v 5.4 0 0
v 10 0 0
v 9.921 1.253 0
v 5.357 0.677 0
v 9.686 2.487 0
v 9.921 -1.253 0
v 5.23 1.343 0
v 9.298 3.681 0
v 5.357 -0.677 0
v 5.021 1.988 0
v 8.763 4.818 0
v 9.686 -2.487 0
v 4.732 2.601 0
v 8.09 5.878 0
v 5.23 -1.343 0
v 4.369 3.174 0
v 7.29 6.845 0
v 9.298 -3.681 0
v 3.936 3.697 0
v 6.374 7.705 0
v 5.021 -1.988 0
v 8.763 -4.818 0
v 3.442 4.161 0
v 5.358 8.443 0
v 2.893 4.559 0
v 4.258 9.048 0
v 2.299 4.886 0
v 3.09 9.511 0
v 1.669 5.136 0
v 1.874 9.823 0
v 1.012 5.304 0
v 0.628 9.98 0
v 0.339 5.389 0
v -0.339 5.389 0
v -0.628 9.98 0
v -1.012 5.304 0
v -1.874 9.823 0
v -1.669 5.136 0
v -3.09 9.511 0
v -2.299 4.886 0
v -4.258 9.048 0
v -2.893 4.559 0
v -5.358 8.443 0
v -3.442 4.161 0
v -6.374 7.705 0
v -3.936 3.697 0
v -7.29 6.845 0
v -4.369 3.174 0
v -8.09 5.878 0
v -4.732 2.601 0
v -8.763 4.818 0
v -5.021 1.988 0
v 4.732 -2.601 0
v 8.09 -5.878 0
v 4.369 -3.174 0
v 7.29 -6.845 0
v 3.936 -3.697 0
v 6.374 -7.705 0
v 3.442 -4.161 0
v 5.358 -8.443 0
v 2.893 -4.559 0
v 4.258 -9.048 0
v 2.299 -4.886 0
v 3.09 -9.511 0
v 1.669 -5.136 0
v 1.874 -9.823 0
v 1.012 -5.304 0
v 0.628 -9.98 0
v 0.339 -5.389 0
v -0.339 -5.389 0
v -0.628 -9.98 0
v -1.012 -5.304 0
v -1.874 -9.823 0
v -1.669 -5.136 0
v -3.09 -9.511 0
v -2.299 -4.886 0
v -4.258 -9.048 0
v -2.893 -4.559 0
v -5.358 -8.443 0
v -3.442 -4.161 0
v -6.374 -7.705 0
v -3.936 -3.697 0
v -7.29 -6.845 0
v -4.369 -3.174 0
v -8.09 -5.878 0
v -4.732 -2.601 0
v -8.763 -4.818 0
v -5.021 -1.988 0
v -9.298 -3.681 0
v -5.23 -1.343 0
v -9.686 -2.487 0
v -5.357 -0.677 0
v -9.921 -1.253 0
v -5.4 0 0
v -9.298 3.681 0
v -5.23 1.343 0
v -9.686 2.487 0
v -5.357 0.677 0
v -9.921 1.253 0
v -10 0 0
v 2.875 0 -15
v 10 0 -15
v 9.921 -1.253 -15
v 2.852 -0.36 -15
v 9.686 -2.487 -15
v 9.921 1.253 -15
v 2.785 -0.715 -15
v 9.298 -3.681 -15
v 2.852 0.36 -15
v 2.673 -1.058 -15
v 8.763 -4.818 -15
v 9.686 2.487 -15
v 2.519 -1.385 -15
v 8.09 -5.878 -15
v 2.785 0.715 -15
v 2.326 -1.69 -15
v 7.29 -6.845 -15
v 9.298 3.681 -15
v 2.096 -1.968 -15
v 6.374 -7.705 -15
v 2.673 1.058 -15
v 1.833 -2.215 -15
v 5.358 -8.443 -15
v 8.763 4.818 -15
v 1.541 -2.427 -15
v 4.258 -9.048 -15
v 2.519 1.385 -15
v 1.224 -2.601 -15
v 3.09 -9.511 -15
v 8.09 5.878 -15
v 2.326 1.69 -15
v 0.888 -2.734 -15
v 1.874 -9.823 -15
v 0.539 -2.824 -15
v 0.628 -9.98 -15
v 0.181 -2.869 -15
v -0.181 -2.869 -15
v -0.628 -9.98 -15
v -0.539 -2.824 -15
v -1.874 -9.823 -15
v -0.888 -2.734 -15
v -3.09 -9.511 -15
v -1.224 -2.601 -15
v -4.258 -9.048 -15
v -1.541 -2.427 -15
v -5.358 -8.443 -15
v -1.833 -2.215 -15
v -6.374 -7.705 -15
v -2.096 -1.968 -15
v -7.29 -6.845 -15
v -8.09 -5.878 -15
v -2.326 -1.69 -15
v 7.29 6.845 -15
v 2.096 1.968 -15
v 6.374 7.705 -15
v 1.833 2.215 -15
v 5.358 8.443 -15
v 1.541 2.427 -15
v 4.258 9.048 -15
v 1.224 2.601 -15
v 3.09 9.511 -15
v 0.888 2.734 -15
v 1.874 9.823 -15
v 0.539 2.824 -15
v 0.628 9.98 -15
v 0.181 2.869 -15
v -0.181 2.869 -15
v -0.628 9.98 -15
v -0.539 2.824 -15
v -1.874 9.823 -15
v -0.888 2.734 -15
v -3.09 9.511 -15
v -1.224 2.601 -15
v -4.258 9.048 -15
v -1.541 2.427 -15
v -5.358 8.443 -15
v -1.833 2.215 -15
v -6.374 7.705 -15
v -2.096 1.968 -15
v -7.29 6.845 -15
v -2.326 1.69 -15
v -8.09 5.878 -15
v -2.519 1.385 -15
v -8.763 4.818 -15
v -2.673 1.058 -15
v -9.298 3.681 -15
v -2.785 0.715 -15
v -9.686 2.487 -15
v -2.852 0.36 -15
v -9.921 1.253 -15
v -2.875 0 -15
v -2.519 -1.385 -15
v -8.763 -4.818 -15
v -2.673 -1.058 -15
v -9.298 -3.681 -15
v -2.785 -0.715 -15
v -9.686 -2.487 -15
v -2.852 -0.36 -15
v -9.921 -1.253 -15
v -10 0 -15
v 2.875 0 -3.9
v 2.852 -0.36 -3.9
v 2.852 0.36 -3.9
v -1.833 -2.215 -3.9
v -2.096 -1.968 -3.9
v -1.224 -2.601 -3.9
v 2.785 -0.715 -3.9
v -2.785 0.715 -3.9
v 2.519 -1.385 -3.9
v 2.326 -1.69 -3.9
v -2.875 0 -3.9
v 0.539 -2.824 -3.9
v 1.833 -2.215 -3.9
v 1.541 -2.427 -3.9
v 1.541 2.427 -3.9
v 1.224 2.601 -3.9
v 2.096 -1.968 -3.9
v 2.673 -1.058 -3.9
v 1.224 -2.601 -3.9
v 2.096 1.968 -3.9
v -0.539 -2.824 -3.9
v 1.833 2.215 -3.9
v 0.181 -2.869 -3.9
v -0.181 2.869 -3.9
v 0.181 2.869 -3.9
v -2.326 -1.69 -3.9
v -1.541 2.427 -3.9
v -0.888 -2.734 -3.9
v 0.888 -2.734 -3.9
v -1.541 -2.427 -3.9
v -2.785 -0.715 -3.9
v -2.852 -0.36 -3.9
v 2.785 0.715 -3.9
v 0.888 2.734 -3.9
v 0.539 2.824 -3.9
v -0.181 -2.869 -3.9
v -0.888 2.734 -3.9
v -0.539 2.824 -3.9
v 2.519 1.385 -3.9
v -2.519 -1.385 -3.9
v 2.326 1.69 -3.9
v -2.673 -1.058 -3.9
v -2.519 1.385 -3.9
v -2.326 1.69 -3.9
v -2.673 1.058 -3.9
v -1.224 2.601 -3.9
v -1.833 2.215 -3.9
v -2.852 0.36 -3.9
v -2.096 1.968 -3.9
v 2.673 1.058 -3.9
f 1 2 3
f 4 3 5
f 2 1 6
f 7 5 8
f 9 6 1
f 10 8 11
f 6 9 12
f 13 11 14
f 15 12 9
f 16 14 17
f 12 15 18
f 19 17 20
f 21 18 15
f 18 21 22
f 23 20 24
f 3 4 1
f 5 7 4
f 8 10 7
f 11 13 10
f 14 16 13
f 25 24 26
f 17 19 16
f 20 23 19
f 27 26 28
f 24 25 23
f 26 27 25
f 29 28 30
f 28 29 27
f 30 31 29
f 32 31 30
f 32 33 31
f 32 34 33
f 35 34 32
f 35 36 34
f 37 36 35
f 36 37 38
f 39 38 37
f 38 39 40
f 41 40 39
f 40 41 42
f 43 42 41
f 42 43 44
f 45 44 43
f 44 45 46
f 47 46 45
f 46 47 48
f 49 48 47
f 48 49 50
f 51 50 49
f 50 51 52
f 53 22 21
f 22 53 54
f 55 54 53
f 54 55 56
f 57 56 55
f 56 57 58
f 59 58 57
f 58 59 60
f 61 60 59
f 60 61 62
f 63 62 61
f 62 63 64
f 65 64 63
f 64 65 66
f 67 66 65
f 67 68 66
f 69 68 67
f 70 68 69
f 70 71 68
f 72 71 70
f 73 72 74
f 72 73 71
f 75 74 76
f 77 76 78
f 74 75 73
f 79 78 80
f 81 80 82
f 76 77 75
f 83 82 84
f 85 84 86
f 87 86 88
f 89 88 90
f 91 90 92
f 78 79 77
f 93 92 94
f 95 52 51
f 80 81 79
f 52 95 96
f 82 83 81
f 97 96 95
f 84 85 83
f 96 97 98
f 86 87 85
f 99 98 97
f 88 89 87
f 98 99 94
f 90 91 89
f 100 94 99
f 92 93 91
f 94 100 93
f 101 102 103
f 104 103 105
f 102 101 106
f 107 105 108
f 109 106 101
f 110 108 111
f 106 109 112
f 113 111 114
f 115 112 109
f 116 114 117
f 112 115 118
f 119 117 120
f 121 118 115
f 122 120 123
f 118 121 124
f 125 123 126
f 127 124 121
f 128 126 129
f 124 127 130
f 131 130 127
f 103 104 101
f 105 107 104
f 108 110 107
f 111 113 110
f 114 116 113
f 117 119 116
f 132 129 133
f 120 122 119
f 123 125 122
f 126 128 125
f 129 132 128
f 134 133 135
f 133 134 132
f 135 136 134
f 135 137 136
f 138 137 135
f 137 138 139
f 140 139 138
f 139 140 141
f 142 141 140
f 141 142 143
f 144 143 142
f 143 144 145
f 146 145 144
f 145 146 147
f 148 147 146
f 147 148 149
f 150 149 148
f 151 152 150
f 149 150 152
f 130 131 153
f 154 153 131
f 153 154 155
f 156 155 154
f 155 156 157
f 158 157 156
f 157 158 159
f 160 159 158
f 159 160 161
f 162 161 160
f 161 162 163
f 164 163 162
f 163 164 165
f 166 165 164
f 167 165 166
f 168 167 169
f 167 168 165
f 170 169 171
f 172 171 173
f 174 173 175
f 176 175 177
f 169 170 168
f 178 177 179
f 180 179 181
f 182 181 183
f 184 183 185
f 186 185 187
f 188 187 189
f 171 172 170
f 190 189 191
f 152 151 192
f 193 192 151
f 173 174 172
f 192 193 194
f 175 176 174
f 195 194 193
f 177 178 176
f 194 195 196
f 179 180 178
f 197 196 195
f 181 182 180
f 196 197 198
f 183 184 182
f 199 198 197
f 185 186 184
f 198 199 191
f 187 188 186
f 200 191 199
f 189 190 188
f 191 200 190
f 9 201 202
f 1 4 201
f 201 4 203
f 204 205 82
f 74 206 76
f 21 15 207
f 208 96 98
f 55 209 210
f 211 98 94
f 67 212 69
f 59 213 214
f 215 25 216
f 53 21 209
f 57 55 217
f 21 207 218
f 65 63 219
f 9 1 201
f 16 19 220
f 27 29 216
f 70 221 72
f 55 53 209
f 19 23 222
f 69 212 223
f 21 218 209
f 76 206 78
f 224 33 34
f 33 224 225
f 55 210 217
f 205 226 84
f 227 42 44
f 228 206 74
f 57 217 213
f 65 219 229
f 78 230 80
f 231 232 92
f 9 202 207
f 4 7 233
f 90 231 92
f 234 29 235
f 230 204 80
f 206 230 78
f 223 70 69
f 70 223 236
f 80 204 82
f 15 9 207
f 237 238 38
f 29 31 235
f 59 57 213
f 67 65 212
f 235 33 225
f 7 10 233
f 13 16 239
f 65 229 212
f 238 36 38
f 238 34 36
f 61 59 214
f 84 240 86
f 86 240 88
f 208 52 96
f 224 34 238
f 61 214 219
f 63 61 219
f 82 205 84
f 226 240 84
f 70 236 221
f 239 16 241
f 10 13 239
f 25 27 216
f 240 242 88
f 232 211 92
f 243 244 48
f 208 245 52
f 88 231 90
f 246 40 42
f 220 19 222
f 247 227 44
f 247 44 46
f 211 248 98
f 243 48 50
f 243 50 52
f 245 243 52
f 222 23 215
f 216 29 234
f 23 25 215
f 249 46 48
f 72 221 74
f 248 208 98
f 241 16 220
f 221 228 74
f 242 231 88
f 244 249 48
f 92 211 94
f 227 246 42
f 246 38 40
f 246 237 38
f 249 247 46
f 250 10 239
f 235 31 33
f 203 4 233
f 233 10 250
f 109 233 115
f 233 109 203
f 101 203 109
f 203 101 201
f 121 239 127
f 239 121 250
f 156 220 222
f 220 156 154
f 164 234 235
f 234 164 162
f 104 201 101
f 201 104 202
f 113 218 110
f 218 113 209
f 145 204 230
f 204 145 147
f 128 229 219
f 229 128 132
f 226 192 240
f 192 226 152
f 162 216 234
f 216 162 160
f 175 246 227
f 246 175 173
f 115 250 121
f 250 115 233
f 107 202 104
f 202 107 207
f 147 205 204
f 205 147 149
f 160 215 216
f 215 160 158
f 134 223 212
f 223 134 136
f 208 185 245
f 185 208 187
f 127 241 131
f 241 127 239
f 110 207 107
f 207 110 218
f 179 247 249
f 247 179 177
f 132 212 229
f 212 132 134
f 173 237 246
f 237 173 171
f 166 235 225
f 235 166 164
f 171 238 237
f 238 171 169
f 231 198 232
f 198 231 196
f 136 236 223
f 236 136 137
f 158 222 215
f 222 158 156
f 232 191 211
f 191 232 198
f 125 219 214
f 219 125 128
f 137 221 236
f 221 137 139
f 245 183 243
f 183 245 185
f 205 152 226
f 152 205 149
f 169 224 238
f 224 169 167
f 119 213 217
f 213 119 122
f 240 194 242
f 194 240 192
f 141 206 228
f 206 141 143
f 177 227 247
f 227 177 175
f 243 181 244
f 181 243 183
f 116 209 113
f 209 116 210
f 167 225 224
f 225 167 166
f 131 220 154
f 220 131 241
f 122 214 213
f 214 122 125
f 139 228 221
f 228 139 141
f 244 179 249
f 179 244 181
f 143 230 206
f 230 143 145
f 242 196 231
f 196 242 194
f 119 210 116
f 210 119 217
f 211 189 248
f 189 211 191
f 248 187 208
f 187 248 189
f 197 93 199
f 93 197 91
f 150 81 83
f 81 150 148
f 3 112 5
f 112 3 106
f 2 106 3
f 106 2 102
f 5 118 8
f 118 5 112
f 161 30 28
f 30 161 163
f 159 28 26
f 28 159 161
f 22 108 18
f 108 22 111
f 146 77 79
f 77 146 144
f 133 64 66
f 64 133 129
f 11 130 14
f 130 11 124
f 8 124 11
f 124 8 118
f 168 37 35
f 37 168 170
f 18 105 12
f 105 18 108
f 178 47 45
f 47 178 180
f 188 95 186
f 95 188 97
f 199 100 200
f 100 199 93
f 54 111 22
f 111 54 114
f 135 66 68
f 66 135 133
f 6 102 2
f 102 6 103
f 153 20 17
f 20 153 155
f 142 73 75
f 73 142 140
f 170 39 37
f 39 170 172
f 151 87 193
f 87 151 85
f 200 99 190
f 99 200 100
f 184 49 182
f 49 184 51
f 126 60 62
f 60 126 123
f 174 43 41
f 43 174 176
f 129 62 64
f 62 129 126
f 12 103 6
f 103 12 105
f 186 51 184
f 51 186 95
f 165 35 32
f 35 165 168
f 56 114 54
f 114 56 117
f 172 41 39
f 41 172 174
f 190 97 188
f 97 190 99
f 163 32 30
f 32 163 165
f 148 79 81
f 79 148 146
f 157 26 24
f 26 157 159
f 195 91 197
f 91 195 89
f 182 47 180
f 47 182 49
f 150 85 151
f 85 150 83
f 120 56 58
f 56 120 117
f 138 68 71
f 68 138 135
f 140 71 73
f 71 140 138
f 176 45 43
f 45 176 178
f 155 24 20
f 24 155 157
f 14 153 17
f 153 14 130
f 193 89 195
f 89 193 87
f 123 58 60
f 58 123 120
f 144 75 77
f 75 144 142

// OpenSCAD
$fn = 50;


difference() {
	union() {
		translate(v = [0, 0, -15.0000000000]) {
			cylinder(h = 15, r = 10.0000000000);
		}
		cylinder(h = 0, r = 16.0000000000);
	}
	union() {
		translate(v = [0, 0, 0]) {
			rotate(a = [0, 0, 0]) {
				difference() {
					union() {
						#translate(v = [0, 0, -15.0000000000]) {
							cylinder(h = 15, r = 2.6000000000);
						}
						#translate(v = [0, 0, -3.9000000000]) {
							cylinder(h = 3.9000000000, r = 10.0000000000, r1 = 2.8750000000, r2 = 5.4000000000);
						}
						#translate(v = [0, 0, -15.0000000000]) {
							cylinder(h = 15, r = 2.8750000000);
						}
						#translate(v = [0, 0, -15.0000000000]) {
							cylinder(h = 15, r = 2.6000000000);
						}
					}
					union();
				}
			}
		}
	}
}
